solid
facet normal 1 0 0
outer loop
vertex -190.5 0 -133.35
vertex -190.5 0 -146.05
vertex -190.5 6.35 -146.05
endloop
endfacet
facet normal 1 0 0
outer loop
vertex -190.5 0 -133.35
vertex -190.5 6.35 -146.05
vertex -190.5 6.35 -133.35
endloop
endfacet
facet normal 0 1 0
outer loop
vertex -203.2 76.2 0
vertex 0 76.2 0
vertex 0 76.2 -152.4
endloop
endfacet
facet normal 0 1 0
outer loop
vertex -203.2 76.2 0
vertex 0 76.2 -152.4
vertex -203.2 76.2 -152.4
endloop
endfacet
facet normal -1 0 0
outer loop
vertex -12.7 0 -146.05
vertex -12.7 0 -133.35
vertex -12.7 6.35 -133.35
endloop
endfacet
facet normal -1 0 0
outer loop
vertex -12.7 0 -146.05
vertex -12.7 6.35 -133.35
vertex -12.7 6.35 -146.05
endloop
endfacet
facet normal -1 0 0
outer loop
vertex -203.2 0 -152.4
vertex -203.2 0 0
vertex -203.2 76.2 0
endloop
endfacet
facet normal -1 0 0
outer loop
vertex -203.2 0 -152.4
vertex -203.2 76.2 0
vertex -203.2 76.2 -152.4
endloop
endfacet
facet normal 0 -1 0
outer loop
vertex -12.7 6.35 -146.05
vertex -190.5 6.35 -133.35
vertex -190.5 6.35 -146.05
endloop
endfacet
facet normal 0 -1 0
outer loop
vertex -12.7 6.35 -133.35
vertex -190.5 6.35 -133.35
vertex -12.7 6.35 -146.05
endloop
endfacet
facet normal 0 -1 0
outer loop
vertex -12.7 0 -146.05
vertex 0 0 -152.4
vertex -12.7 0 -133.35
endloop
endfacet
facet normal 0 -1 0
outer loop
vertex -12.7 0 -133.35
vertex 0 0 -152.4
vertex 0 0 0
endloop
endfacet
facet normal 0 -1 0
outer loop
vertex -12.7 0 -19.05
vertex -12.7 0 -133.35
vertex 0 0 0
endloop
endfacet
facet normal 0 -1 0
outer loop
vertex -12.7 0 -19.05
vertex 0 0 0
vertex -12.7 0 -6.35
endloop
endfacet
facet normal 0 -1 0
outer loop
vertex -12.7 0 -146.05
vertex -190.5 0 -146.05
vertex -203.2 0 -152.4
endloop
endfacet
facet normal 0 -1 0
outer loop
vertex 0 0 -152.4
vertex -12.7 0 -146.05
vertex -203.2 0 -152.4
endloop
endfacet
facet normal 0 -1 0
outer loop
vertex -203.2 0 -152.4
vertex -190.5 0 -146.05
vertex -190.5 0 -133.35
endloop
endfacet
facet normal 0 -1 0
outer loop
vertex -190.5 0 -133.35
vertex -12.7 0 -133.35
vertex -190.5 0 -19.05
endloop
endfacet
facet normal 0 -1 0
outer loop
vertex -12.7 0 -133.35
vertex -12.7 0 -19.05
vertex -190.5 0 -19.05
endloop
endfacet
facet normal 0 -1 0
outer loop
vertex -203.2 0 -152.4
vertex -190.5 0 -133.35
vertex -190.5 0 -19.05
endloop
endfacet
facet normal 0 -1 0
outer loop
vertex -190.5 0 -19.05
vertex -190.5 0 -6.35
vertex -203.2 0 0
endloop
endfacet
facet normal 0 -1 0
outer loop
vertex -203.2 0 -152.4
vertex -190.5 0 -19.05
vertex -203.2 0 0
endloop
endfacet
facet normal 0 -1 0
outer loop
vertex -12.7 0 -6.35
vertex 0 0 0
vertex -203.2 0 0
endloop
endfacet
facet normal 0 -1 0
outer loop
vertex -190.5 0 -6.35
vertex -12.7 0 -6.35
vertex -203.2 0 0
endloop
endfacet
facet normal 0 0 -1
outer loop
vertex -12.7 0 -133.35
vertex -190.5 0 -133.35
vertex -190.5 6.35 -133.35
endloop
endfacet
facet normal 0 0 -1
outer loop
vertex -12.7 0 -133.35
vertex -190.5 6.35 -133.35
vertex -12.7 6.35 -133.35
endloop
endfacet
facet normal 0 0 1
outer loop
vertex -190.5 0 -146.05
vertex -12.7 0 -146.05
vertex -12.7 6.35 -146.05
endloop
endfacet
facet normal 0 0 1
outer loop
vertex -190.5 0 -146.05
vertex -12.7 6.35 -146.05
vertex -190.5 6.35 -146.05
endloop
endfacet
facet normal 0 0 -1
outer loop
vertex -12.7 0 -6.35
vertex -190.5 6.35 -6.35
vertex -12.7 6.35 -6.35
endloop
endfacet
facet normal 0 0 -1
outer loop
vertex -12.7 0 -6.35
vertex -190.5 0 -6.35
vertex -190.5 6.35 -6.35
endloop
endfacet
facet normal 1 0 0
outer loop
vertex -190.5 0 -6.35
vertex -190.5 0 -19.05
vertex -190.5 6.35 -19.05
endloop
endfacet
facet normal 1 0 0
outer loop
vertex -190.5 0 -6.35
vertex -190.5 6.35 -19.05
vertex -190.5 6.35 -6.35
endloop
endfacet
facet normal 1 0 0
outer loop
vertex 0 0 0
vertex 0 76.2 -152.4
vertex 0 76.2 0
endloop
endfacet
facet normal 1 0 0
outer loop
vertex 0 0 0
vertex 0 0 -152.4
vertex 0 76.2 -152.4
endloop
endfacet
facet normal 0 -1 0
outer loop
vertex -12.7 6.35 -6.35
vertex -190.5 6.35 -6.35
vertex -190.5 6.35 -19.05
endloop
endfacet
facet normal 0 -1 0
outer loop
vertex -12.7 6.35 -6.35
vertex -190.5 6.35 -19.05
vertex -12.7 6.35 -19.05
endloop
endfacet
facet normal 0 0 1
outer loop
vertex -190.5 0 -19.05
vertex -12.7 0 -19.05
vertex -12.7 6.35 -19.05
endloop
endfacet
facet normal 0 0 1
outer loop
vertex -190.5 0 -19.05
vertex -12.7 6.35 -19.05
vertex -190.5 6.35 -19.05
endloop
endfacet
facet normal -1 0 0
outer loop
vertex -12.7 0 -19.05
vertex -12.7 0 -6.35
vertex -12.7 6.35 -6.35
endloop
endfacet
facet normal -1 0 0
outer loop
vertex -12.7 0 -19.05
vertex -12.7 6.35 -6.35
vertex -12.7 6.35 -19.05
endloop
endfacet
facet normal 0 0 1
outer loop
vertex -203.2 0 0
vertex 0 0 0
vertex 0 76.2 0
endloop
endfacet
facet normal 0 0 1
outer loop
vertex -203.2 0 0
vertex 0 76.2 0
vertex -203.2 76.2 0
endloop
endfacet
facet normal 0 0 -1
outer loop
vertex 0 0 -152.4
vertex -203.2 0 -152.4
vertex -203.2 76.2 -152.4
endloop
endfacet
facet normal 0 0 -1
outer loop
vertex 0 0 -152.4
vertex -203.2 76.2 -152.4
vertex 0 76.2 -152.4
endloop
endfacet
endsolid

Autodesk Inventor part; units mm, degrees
ref_plane "YZ Plane" through (0, 0, 0) normal (1, 0, 0) x (0, 1, 0)
ref_plane "XZ Plane" through (0, 0, 0) normal (0, 1, 0) x (-1, 0, 0)
ref_plane "XY Plane" through (0, 0, 0) normal (0, 0, 1) x (1, 0, 0)
sketch "Sketch1" plane through (0, 0, 0) normal (0, 1, 0) x (-1, 0, 0)
  line L0 (0, 0) -> (203.2, 0)
  line L1 (203.2, 0) -> (203.2, -152.4)
  line L2 (203.2, -152.4) -> (0, -152.4)
  line L3 (0, -152.4) -> (0, 0)
  dimension "d0" = 203.2
  dimension "d1" = 152.4
extrude "Extrusion1" add sketch "Sketch1" along normal blind 76.2
sketch "Sketch2" plane through (0, 0, 0) normal (0, -1, 0) x (1, 0, 0)
  line L0 (-190.5, -6.35) -> (-12.7, -6.35)
  line L1 (-12.7, -6.35) -> (-12.7, -19.05)
  line L2 (-12.7, -19.05) -> (-190.5, -19.05)
  line L3 (-190.5, -19.05) -> (-190.5, -6.35)
  line L4 (-190.5, -133.35) -> (-12.7, -133.35)
  line L5 (-12.7, -133.35) -> (-12.7, -146.05)
  line L6 (-12.7, -146.05) -> (-190.5, -146.05)
  line L7 (-190.5, -146.05) -> (-190.5, -133.35)
  line L8 (0, -152.4) -> (0, 0) projected
  line L9 (-203.2, 0) -> (-203.2, -152.4) projected
  line L10 (-203.2, -152.4) -> (0, -152.4) projected
  line L11 (0, 0) -> (-203.2, 0) projected
  dimension "d4" = 12.7
  dimension "d5" = 12.7
  dimension "d6" = 12.7
  dimension "d7" = 12.7
  dimension "d8" = 6.35
  dimension "d9" = 6.35
  dimension "d10" = 12.7
  dimension "d11" = 12.7
extrude "Extrusion2" cut sketch "Sketch2" against normal blind 6.35 contours L0 L1 L2 L3 | L4 L5 L6 L7
properties part number "BS #1"
